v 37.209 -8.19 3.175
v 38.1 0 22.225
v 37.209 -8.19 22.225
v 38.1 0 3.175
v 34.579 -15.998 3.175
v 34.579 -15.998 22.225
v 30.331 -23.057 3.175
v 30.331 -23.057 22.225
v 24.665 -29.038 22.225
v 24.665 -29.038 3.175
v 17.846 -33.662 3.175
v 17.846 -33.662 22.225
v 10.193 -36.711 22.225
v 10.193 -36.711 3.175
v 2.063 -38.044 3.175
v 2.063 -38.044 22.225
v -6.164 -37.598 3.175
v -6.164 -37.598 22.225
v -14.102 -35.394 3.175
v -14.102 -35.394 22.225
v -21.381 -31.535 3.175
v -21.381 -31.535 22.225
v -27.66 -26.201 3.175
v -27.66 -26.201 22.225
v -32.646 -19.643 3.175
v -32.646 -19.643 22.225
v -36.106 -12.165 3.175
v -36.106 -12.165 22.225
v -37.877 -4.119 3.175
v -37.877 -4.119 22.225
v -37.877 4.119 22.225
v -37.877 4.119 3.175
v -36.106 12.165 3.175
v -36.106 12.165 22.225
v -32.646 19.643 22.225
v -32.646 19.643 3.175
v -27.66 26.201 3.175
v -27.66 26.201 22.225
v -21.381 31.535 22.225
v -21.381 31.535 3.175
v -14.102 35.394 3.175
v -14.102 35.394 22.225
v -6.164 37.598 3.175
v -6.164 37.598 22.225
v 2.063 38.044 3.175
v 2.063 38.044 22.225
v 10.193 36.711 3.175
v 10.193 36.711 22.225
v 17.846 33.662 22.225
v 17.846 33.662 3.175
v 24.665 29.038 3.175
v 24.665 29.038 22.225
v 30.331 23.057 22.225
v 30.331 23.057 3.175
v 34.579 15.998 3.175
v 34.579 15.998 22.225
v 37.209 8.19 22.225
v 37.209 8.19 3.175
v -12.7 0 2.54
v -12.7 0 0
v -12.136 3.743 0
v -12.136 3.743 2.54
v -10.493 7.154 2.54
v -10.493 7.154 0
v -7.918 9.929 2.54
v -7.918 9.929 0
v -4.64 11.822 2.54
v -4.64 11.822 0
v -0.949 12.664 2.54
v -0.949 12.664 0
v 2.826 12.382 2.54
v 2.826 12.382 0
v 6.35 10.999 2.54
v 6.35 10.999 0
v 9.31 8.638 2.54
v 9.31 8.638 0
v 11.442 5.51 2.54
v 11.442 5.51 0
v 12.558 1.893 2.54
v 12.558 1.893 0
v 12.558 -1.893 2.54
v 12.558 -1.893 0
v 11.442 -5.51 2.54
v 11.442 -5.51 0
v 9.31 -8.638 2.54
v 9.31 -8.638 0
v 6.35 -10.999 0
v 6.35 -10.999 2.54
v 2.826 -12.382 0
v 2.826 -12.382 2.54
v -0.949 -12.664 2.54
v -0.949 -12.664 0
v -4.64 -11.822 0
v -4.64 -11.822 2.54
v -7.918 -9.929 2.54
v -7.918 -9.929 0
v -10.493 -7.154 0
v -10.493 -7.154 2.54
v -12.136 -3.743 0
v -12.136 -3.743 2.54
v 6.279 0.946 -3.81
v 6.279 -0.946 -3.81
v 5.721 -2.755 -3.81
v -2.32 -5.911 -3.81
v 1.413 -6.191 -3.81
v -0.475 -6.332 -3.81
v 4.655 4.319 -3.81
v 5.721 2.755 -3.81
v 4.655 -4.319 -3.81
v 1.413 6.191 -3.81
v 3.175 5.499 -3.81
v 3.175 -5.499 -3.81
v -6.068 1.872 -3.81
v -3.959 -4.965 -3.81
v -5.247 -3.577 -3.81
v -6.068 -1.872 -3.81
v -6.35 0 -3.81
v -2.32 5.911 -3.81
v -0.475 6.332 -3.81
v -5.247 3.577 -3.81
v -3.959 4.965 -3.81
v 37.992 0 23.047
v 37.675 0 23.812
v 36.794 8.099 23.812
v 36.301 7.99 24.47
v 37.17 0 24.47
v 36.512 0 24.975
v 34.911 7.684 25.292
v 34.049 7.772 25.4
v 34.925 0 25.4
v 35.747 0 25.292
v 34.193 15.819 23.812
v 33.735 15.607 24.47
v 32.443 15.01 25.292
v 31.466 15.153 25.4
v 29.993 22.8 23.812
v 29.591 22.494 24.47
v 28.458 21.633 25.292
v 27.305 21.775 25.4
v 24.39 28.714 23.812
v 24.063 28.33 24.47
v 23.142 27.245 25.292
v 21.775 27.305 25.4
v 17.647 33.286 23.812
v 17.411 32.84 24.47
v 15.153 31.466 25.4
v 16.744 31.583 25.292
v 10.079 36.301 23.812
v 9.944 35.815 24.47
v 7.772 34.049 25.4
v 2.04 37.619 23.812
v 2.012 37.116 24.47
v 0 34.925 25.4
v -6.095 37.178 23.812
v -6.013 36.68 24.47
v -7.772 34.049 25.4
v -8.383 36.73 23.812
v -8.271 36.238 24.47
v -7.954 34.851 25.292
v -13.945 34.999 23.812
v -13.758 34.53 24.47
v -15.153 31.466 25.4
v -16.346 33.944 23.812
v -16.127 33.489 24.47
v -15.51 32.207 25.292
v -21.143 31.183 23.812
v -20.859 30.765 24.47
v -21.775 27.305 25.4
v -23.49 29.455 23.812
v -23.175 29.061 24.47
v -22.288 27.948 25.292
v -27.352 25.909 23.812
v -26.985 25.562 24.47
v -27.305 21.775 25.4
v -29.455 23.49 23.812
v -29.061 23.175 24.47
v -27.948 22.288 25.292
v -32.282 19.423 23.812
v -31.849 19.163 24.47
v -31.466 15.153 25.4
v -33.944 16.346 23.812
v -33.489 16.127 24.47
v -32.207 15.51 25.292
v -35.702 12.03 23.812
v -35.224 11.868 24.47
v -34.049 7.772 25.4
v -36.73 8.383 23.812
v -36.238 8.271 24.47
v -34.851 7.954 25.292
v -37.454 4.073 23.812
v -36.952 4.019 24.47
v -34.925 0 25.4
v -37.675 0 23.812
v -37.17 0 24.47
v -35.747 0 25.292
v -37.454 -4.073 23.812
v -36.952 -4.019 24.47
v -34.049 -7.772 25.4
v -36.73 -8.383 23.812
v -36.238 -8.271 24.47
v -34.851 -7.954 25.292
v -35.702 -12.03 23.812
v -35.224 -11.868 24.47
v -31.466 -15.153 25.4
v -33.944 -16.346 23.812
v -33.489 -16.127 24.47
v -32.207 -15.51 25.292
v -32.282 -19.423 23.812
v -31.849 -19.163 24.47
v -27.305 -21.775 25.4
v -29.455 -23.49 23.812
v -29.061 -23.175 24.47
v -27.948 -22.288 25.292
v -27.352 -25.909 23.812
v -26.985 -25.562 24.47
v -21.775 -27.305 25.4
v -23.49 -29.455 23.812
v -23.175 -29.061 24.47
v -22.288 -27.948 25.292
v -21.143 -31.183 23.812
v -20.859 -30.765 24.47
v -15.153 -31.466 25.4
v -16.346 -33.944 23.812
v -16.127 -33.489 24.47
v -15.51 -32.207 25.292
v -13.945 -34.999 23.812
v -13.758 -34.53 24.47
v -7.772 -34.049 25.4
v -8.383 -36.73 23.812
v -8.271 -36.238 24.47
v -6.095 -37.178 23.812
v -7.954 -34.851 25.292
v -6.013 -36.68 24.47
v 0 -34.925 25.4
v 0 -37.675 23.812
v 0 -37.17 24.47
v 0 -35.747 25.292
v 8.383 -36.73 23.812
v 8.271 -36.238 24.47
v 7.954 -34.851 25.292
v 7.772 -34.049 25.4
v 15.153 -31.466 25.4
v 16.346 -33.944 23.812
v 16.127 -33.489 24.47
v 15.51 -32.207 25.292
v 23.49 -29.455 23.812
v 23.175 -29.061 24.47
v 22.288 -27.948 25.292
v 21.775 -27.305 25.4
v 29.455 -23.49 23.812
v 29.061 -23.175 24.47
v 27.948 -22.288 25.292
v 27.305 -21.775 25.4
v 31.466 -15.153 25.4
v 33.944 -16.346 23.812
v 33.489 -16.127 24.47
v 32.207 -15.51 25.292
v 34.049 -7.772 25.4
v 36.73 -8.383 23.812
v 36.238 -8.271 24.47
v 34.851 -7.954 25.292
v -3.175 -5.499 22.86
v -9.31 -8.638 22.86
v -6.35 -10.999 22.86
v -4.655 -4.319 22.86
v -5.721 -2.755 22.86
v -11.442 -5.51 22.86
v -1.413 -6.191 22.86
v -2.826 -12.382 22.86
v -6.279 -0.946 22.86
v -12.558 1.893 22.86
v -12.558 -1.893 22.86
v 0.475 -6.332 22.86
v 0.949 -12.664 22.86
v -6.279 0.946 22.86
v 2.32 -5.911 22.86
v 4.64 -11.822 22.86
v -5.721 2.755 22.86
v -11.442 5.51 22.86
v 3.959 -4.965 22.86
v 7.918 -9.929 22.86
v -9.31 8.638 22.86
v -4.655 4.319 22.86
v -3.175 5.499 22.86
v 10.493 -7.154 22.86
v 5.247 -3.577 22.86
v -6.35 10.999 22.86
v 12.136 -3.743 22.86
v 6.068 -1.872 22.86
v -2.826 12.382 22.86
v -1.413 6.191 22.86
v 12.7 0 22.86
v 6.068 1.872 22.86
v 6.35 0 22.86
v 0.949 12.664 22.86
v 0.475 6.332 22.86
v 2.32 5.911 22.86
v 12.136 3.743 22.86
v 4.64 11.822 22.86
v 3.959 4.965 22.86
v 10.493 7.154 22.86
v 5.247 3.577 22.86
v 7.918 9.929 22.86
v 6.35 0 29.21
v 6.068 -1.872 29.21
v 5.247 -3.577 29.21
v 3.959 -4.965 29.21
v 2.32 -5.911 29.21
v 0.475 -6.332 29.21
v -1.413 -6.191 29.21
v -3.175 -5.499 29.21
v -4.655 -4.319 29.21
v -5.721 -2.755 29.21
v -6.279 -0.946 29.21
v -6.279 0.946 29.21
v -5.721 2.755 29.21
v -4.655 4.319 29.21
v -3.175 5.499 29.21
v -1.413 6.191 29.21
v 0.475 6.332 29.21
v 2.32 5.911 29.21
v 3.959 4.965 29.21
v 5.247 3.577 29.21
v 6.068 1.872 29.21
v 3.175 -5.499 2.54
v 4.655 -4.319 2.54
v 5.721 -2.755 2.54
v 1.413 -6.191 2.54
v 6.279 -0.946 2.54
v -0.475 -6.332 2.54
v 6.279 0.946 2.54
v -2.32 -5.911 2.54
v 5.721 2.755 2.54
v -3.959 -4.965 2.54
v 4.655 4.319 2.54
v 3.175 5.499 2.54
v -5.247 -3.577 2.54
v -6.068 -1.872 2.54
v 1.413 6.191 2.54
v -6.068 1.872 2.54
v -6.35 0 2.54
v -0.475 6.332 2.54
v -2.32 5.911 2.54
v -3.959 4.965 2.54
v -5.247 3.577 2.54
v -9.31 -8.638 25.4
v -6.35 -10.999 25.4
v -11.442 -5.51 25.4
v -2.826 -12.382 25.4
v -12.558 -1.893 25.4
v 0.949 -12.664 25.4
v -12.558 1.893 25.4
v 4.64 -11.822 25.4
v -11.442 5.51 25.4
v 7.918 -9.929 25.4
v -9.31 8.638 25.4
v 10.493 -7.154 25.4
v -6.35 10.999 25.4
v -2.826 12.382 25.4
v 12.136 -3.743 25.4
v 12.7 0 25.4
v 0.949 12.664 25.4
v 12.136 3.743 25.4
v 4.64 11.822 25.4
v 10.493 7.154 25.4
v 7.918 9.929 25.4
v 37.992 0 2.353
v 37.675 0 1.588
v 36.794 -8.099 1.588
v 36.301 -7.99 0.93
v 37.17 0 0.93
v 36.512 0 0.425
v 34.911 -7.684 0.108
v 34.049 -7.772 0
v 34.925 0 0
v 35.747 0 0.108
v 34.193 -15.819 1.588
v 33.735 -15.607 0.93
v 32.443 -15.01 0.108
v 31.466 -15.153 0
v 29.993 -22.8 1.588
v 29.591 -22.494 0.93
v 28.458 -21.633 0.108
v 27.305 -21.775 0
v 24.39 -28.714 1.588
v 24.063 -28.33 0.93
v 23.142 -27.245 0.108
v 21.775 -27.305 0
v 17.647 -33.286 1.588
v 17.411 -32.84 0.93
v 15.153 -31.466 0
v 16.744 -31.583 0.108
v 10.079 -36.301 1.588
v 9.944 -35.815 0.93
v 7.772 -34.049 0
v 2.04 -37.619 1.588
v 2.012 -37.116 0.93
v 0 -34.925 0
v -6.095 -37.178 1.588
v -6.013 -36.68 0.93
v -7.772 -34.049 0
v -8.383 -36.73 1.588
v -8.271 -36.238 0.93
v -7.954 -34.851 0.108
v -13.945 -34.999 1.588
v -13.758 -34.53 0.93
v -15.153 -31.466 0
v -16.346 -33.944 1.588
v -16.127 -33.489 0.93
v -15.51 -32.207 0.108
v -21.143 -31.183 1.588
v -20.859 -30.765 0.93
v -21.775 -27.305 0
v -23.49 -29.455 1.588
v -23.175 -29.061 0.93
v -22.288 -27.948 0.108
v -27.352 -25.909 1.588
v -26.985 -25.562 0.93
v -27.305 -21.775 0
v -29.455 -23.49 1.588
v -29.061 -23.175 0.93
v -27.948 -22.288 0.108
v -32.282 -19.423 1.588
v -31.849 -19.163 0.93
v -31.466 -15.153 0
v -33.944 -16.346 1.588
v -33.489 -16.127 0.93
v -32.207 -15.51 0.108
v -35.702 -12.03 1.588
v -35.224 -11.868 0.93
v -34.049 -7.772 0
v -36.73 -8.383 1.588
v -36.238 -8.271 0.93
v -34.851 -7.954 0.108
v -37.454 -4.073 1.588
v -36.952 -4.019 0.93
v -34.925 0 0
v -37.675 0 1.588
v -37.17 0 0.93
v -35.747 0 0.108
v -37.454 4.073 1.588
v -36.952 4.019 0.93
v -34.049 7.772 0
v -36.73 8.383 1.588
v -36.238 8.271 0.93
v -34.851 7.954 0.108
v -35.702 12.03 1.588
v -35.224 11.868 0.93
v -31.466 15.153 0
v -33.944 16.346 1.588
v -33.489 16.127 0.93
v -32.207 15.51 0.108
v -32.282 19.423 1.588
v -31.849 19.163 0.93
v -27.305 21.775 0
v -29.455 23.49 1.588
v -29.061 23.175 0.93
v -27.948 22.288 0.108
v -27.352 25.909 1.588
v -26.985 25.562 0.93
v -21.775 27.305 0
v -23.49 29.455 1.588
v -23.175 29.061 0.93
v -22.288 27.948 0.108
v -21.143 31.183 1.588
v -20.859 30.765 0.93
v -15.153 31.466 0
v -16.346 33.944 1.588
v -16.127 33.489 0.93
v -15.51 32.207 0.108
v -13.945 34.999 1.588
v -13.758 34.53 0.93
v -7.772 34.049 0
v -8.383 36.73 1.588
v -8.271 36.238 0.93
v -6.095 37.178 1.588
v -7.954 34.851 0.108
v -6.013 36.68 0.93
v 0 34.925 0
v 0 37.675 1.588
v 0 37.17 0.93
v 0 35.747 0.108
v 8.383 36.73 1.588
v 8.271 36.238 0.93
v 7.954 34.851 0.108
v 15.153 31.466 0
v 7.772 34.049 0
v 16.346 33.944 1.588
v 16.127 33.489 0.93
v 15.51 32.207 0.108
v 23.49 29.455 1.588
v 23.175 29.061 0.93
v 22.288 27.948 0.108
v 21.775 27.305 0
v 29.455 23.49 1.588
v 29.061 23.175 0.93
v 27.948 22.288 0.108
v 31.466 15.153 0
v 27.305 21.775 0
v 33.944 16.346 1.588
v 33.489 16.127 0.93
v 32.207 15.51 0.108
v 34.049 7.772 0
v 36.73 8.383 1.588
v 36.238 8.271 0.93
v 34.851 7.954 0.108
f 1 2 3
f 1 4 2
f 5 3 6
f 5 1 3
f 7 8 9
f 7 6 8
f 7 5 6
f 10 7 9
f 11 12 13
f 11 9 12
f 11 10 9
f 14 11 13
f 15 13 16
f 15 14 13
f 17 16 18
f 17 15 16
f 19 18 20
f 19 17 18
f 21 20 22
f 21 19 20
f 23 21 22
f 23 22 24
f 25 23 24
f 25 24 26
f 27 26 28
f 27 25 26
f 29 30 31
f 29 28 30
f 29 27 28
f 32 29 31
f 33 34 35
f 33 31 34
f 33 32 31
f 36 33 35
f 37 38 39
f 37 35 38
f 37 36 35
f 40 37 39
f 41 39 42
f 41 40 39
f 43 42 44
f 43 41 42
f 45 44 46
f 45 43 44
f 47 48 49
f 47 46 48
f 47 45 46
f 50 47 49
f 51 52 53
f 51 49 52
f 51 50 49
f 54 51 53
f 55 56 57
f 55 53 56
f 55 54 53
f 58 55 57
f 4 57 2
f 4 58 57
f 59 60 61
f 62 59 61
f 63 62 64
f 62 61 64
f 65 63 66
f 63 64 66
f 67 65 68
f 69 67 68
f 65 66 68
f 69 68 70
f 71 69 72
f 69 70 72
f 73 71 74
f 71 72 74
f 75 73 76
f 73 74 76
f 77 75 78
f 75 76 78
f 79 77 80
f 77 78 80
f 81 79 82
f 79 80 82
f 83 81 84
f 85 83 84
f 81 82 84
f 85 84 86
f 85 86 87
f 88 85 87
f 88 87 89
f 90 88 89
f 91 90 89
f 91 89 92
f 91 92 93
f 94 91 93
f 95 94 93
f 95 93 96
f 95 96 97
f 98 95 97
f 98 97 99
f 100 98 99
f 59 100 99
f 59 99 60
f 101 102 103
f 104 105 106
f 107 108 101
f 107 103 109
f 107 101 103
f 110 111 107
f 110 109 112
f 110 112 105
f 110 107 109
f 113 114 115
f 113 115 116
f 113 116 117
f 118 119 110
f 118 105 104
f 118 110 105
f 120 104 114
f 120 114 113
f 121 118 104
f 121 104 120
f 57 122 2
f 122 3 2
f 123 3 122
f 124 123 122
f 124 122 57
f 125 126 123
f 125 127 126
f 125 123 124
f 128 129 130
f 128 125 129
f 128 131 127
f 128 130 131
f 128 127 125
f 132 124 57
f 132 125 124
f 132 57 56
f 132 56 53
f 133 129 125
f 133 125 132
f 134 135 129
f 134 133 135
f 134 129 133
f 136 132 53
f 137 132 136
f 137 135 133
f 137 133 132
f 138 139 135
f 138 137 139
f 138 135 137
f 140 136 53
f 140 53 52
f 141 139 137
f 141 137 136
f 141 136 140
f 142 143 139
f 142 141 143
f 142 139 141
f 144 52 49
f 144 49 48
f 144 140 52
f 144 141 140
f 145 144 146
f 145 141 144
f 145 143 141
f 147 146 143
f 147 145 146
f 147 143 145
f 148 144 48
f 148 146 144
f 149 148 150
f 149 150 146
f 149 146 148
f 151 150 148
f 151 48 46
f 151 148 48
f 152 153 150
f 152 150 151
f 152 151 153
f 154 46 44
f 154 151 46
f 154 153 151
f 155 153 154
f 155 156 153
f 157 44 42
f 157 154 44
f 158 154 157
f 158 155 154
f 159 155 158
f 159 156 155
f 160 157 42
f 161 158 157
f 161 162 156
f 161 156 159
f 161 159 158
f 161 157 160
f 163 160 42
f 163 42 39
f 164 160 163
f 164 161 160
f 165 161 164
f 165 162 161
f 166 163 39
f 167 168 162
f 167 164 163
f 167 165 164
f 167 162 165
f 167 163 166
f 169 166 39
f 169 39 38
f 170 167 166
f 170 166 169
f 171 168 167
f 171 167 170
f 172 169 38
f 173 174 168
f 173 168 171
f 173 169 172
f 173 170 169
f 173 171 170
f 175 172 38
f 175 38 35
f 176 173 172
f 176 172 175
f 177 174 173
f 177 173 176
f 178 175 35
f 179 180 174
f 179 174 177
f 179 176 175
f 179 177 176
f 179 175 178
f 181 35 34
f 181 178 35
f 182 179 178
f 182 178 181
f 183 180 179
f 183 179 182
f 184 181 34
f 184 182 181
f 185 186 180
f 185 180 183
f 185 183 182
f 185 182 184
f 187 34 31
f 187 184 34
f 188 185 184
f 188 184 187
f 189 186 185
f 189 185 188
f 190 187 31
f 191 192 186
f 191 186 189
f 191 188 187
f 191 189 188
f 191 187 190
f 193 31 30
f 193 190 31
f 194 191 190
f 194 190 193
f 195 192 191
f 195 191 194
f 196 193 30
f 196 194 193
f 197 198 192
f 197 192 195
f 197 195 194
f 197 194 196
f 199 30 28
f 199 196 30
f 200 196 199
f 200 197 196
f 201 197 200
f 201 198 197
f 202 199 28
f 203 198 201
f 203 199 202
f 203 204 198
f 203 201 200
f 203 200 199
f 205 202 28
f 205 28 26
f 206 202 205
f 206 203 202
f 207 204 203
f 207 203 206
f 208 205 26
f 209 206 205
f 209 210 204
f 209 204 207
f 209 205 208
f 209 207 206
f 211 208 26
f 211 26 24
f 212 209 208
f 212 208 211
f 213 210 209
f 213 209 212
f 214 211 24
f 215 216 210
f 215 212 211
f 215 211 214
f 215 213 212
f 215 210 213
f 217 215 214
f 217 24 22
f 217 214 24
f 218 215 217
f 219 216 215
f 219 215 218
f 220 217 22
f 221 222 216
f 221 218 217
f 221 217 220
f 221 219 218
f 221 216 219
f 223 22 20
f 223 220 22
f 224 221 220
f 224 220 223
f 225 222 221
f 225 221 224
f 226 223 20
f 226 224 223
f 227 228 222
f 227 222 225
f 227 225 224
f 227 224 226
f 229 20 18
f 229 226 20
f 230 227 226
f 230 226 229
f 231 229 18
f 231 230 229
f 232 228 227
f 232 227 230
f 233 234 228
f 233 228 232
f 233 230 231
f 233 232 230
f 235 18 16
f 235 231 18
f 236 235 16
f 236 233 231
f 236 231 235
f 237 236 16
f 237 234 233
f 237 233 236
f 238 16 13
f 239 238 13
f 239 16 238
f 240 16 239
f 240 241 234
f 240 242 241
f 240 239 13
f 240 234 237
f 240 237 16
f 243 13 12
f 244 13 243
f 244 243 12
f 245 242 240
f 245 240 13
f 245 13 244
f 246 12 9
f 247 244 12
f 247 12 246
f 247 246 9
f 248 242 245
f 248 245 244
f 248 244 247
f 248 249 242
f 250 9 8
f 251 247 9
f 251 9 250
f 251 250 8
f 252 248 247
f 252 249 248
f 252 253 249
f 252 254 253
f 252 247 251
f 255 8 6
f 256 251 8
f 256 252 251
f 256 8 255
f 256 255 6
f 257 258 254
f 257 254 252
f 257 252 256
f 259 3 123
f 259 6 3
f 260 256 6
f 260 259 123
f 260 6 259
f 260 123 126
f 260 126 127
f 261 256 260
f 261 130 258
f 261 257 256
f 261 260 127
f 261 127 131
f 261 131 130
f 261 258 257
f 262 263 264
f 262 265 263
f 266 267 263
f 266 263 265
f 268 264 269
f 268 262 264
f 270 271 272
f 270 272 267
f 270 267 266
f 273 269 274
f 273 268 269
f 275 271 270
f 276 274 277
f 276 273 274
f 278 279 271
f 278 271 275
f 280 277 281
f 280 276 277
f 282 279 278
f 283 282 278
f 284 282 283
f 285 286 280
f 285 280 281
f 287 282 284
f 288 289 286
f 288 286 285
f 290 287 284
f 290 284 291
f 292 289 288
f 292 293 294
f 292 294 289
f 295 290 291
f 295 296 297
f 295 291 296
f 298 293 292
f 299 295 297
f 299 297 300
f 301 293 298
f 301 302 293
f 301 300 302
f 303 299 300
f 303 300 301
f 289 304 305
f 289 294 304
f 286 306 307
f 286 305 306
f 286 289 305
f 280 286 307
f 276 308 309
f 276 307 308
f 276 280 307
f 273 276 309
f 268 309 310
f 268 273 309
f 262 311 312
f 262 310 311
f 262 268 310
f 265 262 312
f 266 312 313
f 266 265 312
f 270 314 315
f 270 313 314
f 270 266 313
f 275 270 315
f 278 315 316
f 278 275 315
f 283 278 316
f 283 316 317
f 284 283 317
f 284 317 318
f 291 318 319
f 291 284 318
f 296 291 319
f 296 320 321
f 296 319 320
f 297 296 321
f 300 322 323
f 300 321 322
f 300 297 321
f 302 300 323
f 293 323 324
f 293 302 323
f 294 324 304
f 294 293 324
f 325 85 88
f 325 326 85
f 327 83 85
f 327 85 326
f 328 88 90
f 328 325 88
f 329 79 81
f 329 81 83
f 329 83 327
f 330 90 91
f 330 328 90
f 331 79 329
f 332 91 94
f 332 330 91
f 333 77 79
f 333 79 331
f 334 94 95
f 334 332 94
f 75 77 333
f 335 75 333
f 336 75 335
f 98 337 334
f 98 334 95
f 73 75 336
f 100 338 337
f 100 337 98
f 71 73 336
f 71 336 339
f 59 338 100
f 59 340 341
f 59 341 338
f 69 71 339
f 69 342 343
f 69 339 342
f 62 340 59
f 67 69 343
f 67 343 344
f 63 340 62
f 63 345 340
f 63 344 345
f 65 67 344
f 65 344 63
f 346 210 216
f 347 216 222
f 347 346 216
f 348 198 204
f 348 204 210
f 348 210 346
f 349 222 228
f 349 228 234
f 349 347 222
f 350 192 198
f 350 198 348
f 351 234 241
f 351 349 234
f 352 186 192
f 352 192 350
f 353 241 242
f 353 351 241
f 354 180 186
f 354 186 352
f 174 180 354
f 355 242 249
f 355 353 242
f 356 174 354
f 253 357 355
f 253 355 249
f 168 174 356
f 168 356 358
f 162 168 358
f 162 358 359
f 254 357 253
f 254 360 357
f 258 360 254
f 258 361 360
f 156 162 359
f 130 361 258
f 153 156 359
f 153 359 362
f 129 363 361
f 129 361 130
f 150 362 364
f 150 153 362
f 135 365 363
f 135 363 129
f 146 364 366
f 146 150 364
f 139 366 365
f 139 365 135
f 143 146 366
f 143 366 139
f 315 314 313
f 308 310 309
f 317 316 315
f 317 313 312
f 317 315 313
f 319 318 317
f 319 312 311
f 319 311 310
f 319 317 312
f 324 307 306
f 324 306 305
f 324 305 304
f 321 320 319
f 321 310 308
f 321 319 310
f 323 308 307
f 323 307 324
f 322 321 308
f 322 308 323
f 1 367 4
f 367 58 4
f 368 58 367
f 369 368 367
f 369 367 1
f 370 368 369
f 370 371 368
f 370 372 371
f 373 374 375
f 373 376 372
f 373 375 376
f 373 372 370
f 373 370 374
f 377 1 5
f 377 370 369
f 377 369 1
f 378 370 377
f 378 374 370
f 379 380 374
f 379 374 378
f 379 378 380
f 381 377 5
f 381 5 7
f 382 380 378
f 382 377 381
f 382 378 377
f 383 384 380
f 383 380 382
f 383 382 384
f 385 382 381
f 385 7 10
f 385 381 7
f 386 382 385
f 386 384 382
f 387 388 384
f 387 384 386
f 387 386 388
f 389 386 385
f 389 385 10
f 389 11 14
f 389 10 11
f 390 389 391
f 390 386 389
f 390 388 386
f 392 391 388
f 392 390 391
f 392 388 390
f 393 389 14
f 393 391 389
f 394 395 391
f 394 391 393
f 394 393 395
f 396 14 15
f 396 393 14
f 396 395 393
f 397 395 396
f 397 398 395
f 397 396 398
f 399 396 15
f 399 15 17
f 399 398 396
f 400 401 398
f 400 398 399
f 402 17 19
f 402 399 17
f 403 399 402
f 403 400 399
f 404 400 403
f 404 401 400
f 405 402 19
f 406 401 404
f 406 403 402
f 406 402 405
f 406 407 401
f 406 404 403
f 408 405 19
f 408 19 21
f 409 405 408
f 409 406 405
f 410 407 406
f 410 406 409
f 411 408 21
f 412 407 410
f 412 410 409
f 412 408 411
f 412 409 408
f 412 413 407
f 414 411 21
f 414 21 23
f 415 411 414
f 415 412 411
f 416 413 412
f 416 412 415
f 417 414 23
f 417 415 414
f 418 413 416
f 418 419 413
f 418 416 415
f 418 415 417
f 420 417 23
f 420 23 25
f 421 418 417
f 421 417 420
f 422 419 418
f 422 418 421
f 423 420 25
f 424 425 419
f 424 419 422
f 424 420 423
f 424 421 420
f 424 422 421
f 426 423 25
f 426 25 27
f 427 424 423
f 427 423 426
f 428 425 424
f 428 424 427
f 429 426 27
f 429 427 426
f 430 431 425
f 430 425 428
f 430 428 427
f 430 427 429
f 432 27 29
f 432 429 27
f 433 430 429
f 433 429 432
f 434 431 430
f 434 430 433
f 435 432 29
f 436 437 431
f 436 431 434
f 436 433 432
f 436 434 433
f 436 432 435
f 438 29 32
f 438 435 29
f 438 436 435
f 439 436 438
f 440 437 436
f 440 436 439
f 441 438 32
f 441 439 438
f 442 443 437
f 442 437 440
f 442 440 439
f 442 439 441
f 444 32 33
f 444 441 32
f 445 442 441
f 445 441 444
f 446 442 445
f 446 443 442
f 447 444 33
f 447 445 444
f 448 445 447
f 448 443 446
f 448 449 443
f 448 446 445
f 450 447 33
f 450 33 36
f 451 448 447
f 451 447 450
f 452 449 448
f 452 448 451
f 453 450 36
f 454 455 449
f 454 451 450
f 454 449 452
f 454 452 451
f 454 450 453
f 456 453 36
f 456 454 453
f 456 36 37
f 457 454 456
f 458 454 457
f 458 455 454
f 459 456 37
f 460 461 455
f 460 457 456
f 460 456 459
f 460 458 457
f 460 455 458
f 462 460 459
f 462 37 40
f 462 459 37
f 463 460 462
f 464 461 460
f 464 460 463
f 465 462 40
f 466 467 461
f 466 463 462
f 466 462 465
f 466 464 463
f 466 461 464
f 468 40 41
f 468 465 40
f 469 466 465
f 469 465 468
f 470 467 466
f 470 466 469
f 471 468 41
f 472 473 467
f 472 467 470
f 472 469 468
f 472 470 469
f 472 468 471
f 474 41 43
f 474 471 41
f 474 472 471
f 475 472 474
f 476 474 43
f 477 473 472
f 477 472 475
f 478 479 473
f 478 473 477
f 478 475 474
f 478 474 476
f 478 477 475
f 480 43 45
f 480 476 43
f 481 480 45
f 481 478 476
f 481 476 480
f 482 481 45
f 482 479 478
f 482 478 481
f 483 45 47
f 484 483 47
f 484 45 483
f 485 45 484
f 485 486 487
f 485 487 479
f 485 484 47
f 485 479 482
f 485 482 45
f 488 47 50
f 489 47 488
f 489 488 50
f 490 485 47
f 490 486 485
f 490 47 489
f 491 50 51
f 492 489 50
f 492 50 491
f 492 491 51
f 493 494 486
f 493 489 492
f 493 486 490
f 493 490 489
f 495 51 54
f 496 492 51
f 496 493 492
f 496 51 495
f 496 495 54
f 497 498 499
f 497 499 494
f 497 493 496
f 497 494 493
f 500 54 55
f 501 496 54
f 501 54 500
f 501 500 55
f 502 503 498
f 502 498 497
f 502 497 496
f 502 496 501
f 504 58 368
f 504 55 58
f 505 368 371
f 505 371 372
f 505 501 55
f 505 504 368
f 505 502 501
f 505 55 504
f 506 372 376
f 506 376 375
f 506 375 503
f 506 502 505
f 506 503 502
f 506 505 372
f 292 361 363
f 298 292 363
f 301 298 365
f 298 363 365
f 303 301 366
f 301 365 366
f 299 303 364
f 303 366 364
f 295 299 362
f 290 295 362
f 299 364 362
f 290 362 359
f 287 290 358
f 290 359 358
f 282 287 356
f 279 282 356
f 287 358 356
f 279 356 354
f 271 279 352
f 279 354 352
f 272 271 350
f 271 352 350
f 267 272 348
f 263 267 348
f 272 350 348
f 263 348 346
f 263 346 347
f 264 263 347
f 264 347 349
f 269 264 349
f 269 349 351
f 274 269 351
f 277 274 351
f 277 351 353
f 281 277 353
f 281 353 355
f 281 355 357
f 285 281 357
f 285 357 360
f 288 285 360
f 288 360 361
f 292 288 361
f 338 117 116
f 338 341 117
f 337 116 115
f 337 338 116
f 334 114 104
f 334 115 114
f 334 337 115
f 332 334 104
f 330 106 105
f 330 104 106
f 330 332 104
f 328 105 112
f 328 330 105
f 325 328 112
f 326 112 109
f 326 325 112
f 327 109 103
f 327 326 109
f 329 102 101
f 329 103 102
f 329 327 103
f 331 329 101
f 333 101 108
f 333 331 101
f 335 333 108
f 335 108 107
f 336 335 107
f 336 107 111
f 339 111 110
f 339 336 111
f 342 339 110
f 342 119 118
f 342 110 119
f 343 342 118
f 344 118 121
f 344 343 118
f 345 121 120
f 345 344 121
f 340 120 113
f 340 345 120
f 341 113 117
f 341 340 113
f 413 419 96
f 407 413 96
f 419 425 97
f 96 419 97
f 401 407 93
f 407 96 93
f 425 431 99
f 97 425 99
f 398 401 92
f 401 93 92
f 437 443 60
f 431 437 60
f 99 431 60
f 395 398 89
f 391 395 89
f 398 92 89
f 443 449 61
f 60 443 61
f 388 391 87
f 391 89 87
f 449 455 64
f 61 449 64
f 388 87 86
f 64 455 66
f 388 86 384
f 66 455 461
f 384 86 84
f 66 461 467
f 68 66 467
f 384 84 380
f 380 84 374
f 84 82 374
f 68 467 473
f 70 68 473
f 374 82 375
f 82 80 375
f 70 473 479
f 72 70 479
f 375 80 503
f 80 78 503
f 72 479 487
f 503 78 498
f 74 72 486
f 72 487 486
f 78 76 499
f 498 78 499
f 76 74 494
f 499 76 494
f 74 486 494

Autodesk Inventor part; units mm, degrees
ref_plane "YZ Plane" through (0, 0, 0) normal (1, 0, 0) x (0, 1, 0)
ref_plane "XZ Plane" through (0, 0, 0) normal (0, 1, 0) x (-1, 0, 0)
ref_plane "XY Plane" through (0, 0, 0) normal (0, 0, 1) x (1, 0, 0)
sketch "Sketch1" plane through (0, 0, 0) normal (0, 0, 1) x (1, 0, 0)
  circle A0 centre (0, 0) radius 38.1
  dimension "d0" = 76.2
extrude "Extrusion1" add sketch "Sketch1" along normal blind 25.4
sketch "Sketch2" plane through (0, 0, 25.4) normal (0, 0, 1) x (1, 0, 0)
  circle A0 centre (0, 0) radius 38.1 projected
  circle A1 centre (0, 0) radius 12.7
  dimension "d3" = 25.4
extrude "Extrusion2" cut sketch "Sketch2" against normal blind 2.54 contours A1
sketch "Sketch3" plane through (0, 0, 0) normal (0, 0, -1) x (-1, 0, 0)
  circle A0 centre (0, 0) radius 38.1 projected
  circle A1 centre (0, 0) radius 12.7
  dimension "d6" = 25.4
extrude "Extrusion3" cut sketch "Sketch3" against normal blind 2.54 contours A1
fillet "Fillet1" radius 3.175 2 edges at (-38.1, 0, 25.4) (-38.1, 0, 0)
sketch "Sketch4" plane through (0, 0, 22.86) normal (0, 0, 1) x (1, 0, 0)
  circle A0 centre (0, 0) radius 12.7 projected
  circle A1 centre (0, 0) radius 6.35
  dimension "d10" = 12.7
extrude "Extrusion4" add sketch "Sketch4" along normal blind 6.35 contours A1
sketch "Sketch5" plane through (0, 0, 2.54) normal (0, 0, -1) x (-1, 0, 0)
  circle A0 centre (0, 0) radius 12.7 projected
  circle A1 centre (0, 0) radius 6.35
  dimension "d13" = 12.7
extrude "Extrusion5" add sketch "Sketch5" along normal blind 6.35 contours A1
properties part number "rubber wheel"
